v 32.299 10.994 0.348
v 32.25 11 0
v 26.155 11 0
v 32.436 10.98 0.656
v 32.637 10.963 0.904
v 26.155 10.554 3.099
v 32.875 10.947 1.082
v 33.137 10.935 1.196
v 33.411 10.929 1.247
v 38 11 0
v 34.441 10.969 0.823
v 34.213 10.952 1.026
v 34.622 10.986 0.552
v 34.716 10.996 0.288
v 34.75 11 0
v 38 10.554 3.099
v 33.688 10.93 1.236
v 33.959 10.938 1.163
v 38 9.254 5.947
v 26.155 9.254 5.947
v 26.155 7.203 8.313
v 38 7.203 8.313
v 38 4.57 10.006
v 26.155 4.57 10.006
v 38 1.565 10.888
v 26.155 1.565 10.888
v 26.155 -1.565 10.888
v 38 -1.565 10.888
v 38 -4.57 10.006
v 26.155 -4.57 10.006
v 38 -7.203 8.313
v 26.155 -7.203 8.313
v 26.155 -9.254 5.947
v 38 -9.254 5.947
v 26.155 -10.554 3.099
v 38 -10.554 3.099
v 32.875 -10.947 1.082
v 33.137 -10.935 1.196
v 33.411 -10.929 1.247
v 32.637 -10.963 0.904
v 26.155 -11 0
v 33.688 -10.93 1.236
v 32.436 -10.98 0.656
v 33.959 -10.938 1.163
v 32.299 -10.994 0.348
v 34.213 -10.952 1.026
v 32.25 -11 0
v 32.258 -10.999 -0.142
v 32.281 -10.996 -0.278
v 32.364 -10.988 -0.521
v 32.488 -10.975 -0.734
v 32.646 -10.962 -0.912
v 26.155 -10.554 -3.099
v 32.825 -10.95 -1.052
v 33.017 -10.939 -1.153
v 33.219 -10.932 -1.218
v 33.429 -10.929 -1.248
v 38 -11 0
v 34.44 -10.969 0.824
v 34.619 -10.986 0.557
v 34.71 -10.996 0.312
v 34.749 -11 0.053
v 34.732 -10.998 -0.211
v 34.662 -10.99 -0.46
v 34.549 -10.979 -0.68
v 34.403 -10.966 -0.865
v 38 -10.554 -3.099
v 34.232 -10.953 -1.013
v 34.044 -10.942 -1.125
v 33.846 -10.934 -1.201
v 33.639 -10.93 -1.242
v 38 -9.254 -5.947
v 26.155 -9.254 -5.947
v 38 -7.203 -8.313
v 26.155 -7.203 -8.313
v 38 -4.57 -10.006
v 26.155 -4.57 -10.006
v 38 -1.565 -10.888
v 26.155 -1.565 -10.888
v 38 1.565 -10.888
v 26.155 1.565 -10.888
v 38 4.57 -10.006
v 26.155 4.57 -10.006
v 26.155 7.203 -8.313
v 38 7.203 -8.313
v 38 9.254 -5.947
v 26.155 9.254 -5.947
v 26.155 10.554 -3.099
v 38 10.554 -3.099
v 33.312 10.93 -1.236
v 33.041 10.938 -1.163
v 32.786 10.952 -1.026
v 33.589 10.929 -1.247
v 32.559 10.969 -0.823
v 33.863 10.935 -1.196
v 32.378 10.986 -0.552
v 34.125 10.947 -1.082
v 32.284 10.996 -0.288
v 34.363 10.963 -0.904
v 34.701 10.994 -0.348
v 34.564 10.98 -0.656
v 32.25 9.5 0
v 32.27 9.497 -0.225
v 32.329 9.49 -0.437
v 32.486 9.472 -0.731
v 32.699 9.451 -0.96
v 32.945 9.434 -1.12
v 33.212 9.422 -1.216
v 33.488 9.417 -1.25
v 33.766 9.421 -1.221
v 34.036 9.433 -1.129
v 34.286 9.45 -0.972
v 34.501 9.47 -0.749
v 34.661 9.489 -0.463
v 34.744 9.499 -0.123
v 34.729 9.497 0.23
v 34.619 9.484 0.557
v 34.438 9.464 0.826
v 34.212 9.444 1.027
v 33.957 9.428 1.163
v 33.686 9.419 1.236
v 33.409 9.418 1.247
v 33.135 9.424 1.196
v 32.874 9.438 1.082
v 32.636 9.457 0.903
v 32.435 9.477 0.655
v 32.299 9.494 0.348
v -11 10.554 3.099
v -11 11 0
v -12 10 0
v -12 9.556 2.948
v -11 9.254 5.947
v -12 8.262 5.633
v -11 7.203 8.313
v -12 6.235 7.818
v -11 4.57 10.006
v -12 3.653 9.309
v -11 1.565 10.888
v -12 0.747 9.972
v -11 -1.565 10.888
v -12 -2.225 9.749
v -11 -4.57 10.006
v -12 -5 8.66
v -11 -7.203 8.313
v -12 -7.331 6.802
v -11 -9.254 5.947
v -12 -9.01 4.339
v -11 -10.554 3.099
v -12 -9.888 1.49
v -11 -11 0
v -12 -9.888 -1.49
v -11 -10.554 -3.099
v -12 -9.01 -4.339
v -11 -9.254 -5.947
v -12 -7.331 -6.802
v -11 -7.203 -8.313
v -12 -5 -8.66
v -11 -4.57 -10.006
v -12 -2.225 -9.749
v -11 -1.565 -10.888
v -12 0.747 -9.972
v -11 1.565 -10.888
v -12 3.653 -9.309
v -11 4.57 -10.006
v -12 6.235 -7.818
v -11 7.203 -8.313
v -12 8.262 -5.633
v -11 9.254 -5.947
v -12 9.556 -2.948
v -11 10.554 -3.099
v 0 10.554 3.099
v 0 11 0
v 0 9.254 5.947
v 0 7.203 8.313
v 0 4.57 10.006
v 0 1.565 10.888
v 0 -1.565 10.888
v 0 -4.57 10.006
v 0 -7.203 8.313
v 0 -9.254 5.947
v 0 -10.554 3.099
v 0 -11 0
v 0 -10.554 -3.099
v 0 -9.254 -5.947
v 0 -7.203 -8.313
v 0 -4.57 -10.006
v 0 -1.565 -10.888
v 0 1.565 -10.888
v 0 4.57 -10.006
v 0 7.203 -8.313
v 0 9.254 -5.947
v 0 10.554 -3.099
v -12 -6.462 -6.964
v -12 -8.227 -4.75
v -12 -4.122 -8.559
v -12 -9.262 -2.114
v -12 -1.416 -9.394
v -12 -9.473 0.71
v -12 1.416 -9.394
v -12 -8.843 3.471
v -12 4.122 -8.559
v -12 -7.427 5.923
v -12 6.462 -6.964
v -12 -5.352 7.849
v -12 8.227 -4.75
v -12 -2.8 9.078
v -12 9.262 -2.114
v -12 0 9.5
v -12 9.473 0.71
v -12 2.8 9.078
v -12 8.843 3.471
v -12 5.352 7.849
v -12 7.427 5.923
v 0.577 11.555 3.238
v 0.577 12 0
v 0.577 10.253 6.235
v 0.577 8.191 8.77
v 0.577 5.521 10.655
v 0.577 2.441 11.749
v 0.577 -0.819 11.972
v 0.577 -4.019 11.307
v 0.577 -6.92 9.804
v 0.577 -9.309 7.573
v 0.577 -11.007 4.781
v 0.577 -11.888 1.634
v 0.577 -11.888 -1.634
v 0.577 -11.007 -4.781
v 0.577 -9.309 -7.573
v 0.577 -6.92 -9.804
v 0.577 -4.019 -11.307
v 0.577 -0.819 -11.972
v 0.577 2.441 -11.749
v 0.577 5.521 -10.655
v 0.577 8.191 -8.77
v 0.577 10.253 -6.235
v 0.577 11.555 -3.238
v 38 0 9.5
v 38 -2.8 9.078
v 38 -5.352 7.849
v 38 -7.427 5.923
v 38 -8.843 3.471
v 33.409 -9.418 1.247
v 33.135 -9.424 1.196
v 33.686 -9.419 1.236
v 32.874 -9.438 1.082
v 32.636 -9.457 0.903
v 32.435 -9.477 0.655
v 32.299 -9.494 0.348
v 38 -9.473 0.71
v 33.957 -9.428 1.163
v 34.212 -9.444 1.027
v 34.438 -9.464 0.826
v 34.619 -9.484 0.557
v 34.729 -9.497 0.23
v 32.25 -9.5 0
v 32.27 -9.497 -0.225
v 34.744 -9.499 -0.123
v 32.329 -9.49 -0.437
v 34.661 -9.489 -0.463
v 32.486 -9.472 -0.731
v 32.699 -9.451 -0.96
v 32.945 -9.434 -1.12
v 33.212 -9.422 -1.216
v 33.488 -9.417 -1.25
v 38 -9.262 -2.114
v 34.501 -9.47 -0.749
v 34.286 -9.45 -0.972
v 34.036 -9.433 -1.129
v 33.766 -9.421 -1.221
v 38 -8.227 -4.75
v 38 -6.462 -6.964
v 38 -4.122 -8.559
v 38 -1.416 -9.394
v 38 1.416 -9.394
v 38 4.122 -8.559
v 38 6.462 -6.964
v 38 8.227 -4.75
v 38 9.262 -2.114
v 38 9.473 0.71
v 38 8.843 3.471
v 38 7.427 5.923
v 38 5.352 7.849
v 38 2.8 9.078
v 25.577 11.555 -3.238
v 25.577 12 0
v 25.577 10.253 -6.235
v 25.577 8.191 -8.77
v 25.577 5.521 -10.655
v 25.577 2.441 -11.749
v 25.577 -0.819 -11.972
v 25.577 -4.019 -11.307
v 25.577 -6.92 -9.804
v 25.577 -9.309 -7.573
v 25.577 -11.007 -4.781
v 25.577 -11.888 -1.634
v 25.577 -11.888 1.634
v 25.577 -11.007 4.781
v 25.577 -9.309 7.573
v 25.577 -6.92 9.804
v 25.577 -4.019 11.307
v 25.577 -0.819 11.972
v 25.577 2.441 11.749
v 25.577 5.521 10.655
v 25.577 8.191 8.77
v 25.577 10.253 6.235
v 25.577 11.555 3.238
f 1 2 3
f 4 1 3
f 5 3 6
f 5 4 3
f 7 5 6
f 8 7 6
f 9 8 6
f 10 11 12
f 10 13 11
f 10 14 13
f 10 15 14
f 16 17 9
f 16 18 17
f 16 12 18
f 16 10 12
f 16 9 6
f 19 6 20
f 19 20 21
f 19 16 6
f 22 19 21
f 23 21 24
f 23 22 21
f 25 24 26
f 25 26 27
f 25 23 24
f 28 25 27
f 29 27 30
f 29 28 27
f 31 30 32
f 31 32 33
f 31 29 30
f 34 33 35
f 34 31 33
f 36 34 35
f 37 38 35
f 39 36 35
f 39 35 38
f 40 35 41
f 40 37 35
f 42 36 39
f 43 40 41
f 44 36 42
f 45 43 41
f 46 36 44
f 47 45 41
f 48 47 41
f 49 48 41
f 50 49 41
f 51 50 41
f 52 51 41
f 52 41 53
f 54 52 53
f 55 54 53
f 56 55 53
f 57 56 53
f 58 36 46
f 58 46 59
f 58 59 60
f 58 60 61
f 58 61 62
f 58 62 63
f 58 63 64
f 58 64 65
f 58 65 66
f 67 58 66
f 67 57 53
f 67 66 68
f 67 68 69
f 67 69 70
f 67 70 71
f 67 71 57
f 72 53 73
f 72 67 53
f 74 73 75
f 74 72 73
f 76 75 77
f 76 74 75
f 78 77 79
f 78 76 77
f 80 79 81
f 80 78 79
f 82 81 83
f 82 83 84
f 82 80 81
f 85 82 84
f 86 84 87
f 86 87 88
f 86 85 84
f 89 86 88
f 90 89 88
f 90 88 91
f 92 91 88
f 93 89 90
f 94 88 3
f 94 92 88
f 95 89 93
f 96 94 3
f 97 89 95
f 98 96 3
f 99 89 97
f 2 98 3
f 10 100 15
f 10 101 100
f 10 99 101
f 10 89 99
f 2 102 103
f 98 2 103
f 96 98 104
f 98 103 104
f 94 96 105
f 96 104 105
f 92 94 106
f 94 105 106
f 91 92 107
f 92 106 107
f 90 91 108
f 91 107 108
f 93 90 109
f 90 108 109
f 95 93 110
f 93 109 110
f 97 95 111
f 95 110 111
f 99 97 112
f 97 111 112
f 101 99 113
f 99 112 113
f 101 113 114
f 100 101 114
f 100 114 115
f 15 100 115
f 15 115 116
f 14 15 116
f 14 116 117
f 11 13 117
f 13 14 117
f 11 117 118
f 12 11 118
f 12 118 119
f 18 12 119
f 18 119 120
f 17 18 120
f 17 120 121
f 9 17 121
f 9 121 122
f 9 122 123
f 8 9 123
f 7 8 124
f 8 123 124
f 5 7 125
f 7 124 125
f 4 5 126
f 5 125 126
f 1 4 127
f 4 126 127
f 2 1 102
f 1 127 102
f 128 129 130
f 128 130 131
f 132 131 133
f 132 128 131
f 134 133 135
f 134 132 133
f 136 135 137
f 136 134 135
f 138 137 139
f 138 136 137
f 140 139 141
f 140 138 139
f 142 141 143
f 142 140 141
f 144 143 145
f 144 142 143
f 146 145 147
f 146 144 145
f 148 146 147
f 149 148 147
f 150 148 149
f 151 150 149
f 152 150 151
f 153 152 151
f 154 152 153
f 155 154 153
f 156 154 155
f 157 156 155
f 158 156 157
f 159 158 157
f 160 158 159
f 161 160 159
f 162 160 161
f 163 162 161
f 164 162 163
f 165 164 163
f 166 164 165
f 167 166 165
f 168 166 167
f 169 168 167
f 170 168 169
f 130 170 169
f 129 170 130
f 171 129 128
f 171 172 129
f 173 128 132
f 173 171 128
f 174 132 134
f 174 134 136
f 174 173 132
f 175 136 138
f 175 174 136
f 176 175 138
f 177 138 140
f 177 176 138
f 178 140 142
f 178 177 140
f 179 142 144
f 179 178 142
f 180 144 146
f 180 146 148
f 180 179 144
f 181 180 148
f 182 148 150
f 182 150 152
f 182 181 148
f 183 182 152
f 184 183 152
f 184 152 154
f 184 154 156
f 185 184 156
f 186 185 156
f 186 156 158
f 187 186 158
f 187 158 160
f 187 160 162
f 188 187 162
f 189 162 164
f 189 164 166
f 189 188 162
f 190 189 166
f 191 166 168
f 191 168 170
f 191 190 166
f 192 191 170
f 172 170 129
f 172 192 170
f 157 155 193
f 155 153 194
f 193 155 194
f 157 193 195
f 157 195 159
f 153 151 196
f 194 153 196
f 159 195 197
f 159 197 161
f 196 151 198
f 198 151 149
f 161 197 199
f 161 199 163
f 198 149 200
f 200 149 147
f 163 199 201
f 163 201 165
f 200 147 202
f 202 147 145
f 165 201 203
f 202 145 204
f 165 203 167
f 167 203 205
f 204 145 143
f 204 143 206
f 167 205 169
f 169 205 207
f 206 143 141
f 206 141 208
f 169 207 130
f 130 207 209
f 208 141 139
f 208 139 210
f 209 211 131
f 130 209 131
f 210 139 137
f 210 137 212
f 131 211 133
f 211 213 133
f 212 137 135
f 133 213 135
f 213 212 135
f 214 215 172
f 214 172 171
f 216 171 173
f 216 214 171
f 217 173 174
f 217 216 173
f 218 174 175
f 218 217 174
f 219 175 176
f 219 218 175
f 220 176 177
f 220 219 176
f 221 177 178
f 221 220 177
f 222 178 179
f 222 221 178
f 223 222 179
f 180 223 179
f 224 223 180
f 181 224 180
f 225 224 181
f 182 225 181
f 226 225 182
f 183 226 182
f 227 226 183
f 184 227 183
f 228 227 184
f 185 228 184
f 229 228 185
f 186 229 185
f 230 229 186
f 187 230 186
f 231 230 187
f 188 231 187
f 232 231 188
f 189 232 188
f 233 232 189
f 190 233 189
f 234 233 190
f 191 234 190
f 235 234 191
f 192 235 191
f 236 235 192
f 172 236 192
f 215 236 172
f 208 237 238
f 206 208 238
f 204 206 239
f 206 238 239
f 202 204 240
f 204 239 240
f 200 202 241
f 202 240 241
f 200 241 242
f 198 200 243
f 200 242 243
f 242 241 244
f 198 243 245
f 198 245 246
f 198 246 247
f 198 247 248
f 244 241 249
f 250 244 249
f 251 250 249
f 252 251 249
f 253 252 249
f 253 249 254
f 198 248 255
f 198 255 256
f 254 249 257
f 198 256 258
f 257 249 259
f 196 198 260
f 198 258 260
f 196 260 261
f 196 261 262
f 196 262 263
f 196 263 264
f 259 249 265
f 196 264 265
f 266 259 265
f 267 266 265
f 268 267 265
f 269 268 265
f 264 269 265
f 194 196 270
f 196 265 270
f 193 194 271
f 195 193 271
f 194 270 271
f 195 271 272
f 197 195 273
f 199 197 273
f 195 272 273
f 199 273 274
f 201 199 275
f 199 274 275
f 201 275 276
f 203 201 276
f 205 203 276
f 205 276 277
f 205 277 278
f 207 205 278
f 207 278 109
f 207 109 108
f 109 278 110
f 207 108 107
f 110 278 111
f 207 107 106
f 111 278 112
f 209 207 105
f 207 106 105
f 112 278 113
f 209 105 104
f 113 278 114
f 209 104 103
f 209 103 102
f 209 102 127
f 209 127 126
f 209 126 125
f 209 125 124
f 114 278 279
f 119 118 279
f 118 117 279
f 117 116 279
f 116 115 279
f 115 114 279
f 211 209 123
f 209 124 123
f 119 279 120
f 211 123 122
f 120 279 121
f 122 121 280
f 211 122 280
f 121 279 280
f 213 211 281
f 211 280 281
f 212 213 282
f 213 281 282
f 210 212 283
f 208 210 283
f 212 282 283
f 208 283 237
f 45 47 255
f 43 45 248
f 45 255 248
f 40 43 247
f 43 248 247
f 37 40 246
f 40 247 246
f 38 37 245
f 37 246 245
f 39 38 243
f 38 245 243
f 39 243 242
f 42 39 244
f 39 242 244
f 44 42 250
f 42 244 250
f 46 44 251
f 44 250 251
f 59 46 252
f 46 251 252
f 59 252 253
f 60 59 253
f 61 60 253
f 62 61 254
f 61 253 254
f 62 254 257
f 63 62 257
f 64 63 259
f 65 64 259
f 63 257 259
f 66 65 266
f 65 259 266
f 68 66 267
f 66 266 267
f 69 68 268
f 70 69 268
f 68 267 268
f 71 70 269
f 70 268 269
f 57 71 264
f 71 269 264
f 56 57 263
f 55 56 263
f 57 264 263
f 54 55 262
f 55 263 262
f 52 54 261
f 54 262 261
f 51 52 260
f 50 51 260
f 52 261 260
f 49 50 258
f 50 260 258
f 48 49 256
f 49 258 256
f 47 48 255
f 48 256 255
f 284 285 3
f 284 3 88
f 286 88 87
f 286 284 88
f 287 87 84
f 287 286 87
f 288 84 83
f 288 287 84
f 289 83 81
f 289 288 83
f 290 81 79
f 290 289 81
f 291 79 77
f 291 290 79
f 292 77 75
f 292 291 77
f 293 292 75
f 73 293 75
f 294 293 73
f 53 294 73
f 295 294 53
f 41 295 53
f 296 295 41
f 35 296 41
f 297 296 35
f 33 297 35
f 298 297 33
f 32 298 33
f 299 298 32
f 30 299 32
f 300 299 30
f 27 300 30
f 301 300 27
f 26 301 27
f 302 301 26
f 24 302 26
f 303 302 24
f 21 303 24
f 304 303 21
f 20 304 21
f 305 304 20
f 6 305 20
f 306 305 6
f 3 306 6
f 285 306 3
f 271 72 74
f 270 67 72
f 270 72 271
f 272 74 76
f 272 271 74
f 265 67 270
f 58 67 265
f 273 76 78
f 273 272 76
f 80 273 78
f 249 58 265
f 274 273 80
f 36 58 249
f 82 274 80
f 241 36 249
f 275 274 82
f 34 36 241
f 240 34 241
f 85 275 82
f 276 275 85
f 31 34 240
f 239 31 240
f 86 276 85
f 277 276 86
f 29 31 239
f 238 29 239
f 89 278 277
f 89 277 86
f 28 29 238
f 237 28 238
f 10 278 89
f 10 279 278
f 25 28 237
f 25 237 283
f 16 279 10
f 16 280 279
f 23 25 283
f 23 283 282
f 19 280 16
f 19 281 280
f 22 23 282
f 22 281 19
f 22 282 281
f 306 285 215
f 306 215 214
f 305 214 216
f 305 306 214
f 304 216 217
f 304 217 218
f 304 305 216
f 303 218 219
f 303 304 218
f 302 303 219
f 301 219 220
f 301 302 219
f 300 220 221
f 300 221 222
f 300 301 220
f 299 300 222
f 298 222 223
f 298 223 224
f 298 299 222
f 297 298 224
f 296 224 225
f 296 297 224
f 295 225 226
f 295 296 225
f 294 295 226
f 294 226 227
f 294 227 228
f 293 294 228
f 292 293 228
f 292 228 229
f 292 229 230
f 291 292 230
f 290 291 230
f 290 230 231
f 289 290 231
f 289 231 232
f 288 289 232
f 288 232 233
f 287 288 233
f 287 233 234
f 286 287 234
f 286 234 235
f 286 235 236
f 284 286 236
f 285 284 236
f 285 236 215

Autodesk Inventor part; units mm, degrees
ref_plane "YZ Plane" through (0, 0, 0) normal (1, 0, 0) x (0, 1, 0)
ref_plane "XZ Plane" through (0, 0, 0) normal (0, 1, 0) x (-1, 0, 0)
ref_plane "XY Plane" through (0, 0, 0) normal (0, 0, 1) x (1, 0, 0)
sketch "Profile" plane through (0, 0, 0) normal (0, 0, 1) x (1, 0, 0)
  line L0 (-12, 0) -> (-12, 11)
  line L1 (-12, 11) -> (0, 11)
  line L2 (0, 11) -> (0.5774, 12)
  line L3 (0.5774, 12) -> (25.5774, 12)
  line L4 (25.5774, 12) -> (26.1547, 11)
  line L5 (26.1547, 11) -> (38, 11)
  line L6 (38, 11) -> (38, 0)
  line L7 (-12, 0) -> (0, 0)
  line L8 (0, 0) -> (0, 9)
  line L9 (0, 9) -> (30, 9)
  line L10 (30, 9) -> (30, 0)
  line L11 (30, 0) -> (38, 0)
  line L12 (-22, 0) -> (48, 0) construction
  line L13 (0, 11) -> (0, 9) construction
  dimension "BodyLength" = 50
  dimension "d1" = 11
  dimension "d3" = 120
  dimension "d4" = 120
  dimension "d5" = 25
  dimension "d6" = 12
  dimension "d16" = 8
  dimension "d29" = 1
  dimension "d30" = 9
revolve "ProfileRevolveFeature" add sketch "Profile" angle 360 about axis through (-10, 0, 0) along (1, 0, 0)
sketch "InsideHole" plane through (-12, 0, 0) normal (-1, 0, 0) x (0, 0, 1)
  circle A0 centre (0, 0) radius 9 construction
hole "InsideHoleFeature" at (-12, 0, 0) direction (1, 0, 0) diameter 19 end through all
chamfer "EndChamferFeature" distance 1 angle 45 1 edges at (-12, -11, 0)
sketch "CapMountHole" plane through (0, 0, 0) normal (0, 1, 0) x (-1, 0, 0)
  line L0 (-38, 11) -> (-38, -11) construction
  line L1 (15.2, 0) -> (-91.2, 0) construction
  circle A0 centre (-33.5, 0) radius 1.25
  point P0 (0, 0)
  dimension "d31" = 4.5
  dimension "d39" = 2.5
extrude "CapMountHoleFeature" cut sketch "CapMountHole" along normal through all both and the other way through all
equation "\"d5\" = 0.5 * BodyLength"
equation "\"d6\" = 0.24 * BodyLength"
properties part number "BackPair1PistonBody"
